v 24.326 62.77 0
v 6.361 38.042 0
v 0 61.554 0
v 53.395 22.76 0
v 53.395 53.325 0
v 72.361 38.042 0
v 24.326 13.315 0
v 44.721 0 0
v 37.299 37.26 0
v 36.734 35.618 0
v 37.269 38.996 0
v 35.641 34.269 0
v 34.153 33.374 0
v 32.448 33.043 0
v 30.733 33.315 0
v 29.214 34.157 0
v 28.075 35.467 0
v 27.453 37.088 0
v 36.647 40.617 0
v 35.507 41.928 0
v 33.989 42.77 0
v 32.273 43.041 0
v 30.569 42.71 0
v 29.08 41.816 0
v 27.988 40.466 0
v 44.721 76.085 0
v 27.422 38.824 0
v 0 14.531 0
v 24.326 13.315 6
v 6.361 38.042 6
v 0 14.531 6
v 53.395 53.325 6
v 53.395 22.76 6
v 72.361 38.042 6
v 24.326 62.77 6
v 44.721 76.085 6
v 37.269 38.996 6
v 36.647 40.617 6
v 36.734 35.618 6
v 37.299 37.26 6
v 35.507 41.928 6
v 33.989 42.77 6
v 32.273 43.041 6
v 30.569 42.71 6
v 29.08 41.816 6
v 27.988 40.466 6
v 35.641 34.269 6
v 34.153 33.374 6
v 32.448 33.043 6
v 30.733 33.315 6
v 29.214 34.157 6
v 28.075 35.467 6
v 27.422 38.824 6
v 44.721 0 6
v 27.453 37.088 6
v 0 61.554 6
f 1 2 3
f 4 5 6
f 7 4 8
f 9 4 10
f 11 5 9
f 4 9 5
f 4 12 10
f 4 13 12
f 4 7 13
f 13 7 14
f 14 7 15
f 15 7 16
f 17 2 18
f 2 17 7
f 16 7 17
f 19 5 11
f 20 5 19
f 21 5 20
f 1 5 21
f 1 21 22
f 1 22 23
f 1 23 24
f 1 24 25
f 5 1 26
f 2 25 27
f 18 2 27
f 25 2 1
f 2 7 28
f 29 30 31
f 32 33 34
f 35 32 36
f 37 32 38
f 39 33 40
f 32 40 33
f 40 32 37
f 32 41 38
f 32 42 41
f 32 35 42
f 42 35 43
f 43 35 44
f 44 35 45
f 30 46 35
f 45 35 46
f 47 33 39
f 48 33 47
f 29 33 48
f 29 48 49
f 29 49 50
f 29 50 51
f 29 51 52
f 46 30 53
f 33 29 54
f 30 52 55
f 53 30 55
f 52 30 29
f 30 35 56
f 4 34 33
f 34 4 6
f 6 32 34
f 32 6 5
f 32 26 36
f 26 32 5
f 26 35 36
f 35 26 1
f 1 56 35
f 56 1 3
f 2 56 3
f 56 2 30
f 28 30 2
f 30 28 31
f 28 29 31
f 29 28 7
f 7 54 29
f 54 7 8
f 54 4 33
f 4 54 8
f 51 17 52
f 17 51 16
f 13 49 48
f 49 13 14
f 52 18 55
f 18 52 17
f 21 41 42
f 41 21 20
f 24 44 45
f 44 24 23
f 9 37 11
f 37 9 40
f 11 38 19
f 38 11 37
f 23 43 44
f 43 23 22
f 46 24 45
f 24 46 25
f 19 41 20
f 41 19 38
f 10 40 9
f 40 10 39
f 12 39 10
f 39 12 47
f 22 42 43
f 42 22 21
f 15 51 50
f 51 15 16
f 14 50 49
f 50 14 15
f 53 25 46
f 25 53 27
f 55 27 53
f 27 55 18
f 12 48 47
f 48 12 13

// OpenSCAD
$fn = 32;

// ----------------------------------------------------------------------
// Star wheel: 5-point blunt, R40
// ----------------------------------------------------------------------

// --- parameters (mm) ---
n_points = 5;             // number of points / teeth
r_out = 40;               // tip radius
r_in = 26;                // root radius
bore_r = 5;               // centre bore radius
plate_t = 6;              // plate thickness, Z (extrusion height)
bore_d = 10;              // centre bore diameter

profile = [[72.361, 38.042], [53.395, 53.325], [44.721, 76.085], [24.326, 62.77], [0, 61.554], [6.361, 38.042], [0, 14.531], [24.326, 13.315], [44.721, 0], [53.395, 22.76]];  // primary outline, 10 points, counter clockwise
void_1 = [[37.269, 38.996], [36.647, 40.617], [35.507, 41.928], [33.989, 42.77], [32.273, 43.041], [30.569, 42.71], [29.08, 41.816], [27.988, 40.466], [27.422, 38.824], [27.453, 37.088], [28.075, 35.467], [29.214, 34.157], [30.733, 33.315], [32.448, 33.043], [34.153, 33.374], [35.641, 34.269], [36.734, 35.618], [37.299, 37.26]];  // centre bore, 18 points

// --- the one profile operation ---
difference() {
  linear_extrude(height = plate_t) polygon(points = profile);
  translate([0, 0, -1])
    linear_extrude(height = plate_t + 2) polygon(points = void_1);
}
